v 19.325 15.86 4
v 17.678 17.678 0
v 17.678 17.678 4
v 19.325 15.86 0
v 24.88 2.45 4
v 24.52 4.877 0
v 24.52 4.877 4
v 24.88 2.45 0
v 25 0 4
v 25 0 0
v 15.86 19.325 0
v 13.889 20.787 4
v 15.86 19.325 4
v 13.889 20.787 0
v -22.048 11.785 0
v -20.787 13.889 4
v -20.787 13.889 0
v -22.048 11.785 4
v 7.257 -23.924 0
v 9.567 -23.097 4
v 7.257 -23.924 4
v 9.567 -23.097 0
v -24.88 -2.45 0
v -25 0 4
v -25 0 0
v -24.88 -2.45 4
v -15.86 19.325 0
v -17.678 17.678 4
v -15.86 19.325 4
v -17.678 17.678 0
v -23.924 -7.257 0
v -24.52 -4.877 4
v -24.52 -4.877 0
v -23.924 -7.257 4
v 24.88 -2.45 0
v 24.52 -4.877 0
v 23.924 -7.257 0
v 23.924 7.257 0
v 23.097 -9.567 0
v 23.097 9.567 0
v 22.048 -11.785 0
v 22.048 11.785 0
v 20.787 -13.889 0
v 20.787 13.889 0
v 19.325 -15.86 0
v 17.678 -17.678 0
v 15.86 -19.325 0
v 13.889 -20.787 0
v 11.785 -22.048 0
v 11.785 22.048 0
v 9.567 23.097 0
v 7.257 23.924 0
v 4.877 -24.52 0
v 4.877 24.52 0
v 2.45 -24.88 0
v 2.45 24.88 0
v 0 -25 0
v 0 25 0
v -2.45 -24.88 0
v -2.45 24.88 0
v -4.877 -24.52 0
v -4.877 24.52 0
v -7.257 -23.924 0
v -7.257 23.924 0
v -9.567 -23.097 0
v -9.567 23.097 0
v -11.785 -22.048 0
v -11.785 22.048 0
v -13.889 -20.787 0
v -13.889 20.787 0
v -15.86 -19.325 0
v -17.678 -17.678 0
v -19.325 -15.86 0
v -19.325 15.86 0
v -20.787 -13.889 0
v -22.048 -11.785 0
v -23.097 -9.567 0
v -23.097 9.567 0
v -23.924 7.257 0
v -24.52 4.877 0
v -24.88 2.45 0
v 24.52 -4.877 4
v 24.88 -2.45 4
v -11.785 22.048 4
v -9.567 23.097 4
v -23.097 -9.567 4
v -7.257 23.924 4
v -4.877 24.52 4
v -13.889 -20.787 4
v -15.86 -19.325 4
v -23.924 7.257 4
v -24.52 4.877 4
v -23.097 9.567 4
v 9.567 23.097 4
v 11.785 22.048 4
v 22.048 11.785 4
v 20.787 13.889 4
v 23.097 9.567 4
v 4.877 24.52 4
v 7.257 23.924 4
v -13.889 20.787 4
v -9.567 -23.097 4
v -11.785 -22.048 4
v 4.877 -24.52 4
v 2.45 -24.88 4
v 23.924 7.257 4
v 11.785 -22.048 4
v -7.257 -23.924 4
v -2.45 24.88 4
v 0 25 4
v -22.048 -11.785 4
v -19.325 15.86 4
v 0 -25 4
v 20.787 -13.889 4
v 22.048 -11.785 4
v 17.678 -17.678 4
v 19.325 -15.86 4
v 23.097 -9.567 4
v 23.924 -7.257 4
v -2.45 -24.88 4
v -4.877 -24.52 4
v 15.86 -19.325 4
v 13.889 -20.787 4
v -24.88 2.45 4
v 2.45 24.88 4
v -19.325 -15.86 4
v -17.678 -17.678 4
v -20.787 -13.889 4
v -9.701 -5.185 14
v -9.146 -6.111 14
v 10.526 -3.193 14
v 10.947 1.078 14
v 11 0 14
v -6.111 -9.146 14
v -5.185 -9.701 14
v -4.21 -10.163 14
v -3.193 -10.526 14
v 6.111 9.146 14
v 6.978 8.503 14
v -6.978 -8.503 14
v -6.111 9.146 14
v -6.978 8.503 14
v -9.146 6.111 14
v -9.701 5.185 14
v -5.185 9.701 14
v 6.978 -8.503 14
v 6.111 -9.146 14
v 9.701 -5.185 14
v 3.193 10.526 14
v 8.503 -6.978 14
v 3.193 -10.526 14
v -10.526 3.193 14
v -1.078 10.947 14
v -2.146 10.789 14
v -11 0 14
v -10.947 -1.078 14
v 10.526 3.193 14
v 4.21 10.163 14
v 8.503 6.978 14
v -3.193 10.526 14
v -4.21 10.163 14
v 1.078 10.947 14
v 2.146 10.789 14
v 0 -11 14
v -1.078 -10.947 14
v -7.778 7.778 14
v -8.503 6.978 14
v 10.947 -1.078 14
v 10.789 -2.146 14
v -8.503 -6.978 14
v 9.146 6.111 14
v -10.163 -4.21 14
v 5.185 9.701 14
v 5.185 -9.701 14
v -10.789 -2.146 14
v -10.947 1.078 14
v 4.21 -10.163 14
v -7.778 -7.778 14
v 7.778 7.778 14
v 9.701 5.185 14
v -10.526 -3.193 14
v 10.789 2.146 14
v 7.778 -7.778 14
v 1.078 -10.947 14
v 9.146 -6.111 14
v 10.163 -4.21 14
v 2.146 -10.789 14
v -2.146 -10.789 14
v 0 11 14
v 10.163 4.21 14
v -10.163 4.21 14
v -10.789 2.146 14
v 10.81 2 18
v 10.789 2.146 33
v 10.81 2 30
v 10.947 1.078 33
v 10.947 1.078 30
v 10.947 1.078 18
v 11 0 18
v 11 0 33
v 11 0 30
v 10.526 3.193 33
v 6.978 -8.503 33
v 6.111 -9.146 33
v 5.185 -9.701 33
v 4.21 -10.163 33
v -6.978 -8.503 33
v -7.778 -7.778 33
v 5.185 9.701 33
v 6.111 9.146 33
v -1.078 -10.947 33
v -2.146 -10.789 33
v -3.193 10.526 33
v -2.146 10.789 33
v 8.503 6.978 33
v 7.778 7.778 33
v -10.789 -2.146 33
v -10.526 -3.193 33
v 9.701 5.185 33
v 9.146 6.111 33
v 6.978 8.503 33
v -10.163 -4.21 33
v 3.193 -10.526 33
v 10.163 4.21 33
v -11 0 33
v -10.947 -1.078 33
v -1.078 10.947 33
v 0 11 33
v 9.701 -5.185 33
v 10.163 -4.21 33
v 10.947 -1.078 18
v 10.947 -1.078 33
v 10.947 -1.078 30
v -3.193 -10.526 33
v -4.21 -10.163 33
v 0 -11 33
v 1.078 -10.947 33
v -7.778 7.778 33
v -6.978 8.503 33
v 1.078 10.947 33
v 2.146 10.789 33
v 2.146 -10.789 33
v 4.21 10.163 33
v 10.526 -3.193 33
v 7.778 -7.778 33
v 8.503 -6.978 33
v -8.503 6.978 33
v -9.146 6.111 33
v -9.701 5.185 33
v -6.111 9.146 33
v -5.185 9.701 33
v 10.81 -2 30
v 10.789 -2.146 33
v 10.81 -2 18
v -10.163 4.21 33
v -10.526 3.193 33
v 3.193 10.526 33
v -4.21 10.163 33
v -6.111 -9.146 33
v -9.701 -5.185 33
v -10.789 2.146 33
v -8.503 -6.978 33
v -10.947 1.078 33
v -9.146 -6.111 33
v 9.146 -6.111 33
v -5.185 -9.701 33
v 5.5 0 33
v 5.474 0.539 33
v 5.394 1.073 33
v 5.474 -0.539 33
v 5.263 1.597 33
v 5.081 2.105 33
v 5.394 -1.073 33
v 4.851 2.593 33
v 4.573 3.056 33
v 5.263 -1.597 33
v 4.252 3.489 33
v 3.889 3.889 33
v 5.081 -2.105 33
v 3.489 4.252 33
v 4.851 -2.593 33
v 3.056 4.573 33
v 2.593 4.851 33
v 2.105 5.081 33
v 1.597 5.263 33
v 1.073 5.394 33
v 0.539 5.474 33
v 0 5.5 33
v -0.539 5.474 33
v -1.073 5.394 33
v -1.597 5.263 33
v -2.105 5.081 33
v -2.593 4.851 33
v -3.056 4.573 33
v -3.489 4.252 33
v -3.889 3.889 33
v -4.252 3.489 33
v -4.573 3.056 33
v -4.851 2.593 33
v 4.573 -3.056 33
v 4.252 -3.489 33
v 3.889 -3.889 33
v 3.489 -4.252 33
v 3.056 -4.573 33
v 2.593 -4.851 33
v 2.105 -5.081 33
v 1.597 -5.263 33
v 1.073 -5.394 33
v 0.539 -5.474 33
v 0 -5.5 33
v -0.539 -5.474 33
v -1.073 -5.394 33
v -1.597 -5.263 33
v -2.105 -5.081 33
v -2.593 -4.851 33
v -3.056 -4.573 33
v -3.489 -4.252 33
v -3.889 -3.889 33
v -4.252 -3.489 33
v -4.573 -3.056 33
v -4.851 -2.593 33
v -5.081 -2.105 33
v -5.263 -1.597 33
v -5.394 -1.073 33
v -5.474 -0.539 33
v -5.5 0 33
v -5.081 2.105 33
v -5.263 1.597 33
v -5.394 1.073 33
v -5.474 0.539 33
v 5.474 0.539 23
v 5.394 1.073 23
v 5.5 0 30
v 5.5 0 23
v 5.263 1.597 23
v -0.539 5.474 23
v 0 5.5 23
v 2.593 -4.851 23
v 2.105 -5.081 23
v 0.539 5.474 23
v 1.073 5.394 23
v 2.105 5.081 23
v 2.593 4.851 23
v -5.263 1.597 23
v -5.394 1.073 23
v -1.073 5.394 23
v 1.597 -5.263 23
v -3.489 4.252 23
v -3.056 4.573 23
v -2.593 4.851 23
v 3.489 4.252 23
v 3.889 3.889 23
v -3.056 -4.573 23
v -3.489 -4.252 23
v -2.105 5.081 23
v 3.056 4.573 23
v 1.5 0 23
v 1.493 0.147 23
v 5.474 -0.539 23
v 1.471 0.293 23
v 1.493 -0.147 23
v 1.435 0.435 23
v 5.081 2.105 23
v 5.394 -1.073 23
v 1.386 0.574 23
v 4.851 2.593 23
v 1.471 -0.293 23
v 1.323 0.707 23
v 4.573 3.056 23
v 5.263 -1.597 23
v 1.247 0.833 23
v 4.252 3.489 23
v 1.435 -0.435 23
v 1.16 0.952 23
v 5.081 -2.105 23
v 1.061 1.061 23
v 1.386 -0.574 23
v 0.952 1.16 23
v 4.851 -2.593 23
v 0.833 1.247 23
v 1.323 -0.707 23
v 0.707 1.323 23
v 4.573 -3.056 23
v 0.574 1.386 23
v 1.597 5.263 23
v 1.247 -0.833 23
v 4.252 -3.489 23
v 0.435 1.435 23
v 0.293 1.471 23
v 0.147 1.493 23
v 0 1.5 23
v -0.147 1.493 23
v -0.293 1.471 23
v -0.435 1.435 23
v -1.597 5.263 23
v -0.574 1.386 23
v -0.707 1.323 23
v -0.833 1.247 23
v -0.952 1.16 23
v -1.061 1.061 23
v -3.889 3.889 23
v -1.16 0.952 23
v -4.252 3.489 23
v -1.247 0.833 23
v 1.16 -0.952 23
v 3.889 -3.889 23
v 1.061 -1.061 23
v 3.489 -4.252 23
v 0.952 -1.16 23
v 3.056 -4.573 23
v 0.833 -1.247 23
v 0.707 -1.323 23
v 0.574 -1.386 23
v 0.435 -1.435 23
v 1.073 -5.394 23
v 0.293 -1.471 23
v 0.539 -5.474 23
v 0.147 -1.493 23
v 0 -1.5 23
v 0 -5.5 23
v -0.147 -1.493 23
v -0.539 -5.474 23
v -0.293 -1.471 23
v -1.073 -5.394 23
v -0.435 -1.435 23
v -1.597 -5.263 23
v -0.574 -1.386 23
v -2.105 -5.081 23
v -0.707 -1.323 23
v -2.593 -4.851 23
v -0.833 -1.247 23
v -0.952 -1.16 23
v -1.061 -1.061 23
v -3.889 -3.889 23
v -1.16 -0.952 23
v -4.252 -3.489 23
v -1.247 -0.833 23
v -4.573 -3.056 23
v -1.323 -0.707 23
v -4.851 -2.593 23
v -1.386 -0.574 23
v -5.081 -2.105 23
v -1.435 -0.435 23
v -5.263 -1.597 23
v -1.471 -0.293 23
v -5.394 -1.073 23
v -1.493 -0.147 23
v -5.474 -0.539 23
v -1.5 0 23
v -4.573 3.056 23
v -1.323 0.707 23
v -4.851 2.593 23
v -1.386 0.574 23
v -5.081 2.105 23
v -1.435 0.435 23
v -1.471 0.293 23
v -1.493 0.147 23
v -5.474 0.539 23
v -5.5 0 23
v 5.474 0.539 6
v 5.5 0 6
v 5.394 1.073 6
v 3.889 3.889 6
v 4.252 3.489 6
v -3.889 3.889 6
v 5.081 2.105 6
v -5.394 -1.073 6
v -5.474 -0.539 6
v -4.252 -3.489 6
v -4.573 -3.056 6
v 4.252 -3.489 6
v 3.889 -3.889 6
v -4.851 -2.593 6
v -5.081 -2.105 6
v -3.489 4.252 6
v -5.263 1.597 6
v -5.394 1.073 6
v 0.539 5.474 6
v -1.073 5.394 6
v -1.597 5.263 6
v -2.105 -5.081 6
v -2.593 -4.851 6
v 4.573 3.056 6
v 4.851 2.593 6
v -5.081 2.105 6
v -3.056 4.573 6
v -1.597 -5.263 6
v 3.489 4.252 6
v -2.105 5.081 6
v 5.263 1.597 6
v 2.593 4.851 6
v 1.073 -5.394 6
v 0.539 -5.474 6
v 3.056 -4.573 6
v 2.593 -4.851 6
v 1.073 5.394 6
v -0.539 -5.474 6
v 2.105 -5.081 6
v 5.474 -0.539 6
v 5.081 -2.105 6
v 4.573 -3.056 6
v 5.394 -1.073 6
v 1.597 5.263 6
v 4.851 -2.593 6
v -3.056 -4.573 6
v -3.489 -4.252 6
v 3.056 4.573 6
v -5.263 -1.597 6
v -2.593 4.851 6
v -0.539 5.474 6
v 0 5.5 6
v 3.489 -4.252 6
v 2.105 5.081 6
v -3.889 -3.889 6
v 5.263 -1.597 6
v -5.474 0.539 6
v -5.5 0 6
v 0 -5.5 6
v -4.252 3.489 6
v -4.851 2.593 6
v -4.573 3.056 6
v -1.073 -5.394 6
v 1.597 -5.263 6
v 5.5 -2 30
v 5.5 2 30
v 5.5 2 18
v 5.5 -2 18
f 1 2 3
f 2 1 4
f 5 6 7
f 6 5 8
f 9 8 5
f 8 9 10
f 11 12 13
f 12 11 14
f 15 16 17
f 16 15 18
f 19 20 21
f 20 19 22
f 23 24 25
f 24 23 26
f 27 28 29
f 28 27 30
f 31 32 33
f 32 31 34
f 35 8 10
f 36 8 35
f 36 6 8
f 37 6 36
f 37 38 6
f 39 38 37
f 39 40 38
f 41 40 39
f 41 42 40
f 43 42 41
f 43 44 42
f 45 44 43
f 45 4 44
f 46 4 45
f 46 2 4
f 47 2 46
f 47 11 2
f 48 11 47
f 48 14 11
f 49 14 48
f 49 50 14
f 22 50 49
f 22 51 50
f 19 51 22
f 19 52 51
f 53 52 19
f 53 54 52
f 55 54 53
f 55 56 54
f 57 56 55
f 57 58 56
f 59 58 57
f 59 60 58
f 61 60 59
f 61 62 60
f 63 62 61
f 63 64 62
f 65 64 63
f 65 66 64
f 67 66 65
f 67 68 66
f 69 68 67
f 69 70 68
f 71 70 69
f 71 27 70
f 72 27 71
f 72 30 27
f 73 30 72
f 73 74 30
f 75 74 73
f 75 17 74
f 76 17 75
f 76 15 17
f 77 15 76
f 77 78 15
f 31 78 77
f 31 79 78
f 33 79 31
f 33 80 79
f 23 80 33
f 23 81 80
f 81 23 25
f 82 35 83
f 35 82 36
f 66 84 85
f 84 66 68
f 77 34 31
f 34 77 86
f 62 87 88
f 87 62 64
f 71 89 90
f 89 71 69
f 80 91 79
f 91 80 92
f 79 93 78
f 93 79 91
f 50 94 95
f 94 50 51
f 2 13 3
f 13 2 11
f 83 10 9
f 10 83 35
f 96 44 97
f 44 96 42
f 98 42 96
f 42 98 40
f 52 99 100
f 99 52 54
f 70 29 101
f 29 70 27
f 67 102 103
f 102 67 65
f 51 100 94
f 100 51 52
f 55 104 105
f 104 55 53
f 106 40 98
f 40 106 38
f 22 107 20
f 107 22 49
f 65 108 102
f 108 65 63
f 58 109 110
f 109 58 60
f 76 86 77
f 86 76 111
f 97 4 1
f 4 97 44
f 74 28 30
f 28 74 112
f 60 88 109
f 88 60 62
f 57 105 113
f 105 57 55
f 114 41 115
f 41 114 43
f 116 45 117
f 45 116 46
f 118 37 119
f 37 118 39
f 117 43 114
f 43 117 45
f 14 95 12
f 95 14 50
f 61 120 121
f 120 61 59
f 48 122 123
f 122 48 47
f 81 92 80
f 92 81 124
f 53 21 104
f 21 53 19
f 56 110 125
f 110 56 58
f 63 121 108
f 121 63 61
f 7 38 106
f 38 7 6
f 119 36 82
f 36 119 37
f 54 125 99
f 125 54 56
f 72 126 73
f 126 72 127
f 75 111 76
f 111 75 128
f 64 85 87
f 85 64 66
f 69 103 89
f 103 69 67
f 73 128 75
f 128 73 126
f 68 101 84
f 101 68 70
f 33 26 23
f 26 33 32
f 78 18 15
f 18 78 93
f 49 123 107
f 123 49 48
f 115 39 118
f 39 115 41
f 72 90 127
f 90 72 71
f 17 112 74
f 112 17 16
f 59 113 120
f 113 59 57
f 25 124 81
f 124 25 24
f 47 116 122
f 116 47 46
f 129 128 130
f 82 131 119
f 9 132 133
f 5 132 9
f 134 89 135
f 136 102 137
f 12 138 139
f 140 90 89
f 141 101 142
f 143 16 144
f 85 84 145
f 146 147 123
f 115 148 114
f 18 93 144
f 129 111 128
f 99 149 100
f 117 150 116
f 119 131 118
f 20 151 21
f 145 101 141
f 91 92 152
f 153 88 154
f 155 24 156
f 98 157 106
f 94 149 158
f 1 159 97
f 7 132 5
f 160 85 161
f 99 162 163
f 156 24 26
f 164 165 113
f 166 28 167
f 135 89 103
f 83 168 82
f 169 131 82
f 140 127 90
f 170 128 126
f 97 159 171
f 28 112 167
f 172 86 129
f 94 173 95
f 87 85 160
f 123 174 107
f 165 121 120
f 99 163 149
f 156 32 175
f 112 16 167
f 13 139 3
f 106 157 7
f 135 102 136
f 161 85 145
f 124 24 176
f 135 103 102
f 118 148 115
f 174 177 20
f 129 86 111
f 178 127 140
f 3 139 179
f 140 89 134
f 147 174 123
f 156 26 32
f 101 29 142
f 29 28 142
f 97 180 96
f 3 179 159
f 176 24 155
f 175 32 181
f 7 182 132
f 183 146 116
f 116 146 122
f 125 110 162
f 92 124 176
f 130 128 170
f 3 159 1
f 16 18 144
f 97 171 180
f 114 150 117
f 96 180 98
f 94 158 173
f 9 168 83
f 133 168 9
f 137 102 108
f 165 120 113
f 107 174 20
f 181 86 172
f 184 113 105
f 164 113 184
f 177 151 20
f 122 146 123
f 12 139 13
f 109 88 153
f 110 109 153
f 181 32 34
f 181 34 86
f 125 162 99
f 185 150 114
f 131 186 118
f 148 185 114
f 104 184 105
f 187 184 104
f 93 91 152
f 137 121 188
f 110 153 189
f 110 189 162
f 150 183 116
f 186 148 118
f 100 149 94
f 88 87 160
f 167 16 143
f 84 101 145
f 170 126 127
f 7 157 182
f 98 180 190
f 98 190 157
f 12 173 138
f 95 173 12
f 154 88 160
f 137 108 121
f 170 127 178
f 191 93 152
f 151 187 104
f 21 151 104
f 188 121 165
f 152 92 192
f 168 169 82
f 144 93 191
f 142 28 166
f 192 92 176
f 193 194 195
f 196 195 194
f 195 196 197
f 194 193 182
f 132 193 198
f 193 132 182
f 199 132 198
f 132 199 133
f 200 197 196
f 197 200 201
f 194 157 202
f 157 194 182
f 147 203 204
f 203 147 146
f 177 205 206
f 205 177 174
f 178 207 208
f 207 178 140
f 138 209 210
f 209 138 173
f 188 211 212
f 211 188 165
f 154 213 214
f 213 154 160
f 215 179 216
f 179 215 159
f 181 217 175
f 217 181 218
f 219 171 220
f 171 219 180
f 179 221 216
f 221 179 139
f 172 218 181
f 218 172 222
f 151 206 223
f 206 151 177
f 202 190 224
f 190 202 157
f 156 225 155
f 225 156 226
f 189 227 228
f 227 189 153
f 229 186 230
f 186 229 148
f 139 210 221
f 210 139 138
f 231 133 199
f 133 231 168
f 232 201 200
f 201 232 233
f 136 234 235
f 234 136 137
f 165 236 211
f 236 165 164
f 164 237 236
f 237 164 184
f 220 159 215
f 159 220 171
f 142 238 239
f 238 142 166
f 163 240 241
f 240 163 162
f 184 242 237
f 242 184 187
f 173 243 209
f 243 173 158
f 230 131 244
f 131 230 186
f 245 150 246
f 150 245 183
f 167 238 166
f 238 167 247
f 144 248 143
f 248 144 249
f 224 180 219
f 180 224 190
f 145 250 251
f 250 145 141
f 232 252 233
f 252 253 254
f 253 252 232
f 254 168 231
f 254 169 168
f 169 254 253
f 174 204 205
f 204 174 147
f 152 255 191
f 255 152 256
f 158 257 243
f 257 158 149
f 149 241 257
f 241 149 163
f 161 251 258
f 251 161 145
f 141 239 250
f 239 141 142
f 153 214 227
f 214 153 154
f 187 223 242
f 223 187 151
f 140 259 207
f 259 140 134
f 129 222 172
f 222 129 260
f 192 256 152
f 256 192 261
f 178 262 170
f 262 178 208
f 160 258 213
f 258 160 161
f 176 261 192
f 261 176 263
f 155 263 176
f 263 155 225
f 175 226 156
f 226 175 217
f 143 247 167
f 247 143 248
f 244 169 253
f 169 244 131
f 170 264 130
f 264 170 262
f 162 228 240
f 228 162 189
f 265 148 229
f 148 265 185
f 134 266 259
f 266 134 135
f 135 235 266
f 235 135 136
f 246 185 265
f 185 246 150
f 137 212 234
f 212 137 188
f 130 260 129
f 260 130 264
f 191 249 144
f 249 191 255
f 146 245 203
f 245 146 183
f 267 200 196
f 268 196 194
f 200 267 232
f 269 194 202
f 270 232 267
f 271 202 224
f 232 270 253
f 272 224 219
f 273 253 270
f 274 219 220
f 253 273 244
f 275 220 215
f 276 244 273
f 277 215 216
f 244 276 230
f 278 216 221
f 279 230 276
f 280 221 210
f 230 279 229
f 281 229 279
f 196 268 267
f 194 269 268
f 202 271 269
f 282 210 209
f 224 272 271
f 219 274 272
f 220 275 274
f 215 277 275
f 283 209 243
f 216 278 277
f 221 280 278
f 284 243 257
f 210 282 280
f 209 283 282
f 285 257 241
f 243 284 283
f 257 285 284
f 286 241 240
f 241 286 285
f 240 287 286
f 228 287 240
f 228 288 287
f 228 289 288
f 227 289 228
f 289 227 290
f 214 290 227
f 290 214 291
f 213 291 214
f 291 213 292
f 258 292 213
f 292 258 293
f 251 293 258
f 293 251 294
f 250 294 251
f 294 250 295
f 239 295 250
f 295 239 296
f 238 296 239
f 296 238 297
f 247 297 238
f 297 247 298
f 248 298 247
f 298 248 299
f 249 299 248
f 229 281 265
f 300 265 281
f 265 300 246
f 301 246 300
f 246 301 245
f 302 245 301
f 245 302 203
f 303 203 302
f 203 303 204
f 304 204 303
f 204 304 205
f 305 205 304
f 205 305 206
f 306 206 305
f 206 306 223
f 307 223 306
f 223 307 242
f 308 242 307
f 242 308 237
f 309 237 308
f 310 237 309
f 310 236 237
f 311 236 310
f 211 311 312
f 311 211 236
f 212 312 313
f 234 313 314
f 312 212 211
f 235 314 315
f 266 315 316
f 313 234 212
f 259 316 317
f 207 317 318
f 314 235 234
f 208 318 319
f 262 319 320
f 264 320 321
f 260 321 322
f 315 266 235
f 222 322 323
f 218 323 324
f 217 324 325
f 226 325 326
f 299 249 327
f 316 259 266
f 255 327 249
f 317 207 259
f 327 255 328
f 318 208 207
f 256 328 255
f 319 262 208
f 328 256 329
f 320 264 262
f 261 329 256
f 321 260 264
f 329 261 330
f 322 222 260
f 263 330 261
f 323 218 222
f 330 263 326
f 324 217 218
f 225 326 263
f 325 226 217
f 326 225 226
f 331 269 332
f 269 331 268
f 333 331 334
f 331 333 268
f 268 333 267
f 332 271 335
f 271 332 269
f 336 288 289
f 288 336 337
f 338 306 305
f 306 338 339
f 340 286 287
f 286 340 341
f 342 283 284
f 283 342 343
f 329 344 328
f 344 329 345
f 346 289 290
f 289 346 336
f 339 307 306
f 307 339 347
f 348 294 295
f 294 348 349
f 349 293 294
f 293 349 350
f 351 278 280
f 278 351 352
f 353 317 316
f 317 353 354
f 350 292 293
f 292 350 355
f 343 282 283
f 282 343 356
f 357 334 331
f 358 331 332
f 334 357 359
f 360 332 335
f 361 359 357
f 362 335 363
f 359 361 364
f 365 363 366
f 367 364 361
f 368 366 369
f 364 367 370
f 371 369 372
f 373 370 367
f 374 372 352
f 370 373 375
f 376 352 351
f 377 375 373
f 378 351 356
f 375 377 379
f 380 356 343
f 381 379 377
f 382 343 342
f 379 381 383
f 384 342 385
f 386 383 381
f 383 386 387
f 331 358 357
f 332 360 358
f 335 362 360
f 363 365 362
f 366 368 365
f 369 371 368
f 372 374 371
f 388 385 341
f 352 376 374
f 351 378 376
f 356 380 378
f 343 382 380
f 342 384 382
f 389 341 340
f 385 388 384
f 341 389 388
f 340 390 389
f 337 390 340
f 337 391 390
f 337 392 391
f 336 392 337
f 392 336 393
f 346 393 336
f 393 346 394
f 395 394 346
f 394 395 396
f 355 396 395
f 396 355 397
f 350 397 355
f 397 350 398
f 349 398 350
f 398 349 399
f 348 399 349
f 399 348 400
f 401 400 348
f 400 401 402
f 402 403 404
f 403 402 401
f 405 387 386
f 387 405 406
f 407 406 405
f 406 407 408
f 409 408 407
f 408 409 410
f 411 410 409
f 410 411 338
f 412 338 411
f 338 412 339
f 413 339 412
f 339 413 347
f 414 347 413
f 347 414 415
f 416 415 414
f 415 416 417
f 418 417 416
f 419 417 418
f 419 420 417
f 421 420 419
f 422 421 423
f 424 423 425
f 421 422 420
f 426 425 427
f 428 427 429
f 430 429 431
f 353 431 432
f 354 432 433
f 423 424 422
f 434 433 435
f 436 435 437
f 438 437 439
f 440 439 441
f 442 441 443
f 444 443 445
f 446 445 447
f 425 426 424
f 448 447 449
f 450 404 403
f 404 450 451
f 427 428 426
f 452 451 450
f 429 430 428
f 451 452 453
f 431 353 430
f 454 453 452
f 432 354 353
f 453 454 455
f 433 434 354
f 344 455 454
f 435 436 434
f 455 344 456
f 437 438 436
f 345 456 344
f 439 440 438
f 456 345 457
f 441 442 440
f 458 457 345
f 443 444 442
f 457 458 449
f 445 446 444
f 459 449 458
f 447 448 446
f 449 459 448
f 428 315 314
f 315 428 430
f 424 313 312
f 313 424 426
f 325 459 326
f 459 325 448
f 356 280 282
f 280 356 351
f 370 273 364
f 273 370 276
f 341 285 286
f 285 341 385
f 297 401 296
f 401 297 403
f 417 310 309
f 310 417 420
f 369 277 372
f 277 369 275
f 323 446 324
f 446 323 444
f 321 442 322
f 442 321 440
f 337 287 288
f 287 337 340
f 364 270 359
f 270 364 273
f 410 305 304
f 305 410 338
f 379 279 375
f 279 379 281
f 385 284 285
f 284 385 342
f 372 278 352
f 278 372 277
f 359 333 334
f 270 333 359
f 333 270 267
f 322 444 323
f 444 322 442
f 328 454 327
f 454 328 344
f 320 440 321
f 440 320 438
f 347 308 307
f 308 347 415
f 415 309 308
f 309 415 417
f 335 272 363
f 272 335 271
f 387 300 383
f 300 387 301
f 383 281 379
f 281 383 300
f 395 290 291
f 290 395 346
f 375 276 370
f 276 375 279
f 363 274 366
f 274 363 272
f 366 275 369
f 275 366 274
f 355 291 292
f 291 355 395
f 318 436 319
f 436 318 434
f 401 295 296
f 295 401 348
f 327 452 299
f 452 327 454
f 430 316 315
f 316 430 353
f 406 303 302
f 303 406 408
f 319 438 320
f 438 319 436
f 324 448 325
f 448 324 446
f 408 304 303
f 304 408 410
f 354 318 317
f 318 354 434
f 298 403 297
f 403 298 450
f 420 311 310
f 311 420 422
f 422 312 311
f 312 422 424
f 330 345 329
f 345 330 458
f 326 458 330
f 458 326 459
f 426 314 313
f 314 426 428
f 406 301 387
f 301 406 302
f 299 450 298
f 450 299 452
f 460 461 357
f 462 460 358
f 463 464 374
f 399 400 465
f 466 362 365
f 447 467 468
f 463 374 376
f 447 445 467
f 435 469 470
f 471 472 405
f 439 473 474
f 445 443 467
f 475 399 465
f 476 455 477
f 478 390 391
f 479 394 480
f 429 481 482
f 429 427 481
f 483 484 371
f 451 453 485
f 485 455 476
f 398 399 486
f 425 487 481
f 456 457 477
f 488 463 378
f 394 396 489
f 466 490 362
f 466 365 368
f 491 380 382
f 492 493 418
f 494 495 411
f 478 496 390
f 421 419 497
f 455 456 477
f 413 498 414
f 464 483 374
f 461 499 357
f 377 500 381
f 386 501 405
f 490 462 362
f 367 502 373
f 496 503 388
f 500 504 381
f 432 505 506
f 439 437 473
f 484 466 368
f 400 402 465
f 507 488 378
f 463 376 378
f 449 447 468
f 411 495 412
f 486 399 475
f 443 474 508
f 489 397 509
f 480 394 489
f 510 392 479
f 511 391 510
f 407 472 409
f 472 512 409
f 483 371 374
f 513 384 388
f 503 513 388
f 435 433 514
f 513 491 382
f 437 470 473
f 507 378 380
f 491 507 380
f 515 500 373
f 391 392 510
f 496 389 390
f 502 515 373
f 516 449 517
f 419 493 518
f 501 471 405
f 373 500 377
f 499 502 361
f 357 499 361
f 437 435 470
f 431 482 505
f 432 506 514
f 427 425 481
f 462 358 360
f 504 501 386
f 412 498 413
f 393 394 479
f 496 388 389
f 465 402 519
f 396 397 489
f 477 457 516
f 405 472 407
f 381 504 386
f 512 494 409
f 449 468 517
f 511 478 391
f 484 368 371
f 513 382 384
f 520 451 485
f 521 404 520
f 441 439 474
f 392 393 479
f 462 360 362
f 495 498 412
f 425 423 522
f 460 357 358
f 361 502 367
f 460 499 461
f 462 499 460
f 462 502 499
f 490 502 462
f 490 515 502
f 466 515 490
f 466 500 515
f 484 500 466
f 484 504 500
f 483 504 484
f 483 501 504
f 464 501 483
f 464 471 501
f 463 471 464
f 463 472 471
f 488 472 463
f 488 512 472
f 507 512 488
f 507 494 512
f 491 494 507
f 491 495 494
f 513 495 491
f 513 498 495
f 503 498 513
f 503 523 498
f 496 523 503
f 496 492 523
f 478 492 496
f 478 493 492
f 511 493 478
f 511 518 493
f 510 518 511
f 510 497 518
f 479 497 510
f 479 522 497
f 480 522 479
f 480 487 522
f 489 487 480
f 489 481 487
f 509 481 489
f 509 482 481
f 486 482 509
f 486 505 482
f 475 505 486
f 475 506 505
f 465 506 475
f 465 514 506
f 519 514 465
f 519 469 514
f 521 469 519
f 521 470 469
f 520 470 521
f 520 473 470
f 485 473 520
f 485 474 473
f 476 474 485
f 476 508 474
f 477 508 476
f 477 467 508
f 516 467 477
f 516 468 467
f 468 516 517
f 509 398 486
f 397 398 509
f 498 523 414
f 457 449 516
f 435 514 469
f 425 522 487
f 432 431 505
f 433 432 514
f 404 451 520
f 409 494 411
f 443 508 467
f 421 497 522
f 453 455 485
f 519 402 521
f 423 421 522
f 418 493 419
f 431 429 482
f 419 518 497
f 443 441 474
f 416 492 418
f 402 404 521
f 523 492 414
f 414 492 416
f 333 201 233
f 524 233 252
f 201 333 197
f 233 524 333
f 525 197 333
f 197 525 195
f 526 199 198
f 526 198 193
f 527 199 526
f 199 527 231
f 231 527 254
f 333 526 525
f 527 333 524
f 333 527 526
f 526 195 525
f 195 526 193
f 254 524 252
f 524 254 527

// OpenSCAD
// 1.5 mL microcentrifuge tube stand for an analytical balance
// Printed standing up: rests on XY plane at z = 0, builds upward (+Z), centred on origin.

$fn = 64;

// ---- Overall body dimensions (mm) ----
base_d   = 50;   // base disc diameter
base_h   = 4;    // base disc height (z = 0 .. 4)
cone_top_d = 22; // cone narrows to this diameter at z = 14
cone_h   = 10;   // cone height (z = 4 .. 14)
col_d    = 22;   // column diameter
col_h    = 19;   // column height (z = 14 .. 33)
top_z    = 33;   // top of the stand

// ---- Tube seat (bore) dimensions ----
seat_d   = 11;   // seat bore diameter (z = 33 .. 23)
seat_h   = 10;   // seat bore height (z = 23 .. 33)
tip_d    = 3;    // cone bore narrows to this at z = 6
tip_h    = 17;   // cone bore height (z = 6 .. 23)

// ---- Viewing window dimensions ----
win_w    = 4;    // window width in Y
win_z0   = 18;   // window bottom z
win_z1   = 30;   // window top z
win_h    = win_z1 - win_z0;

// ---- Build the solid body (base + cone + column) ----
module body() { union() {
    // base disc
    translate([0, 0, 0])
        cylinder(h = base_h, d = base_d);

    // cone narrowing from base_d to cone_top_d
    translate([0, 0, base_h])
        cylinder(h = cone_h, d1 = base_d, d2 = cone_top_d);

    // column
    translate([0, 0, base_h + cone_h])
        cylinder(h = col_h, d = col_d);
} }

// ---- Tube seat bore (cylinder + cone), extended 1 mm past the top ----
module seat() { union() {
    // seat cylinder: z = 23 .. 34 (1 mm past top at 33)
    translate([0, 0, 23])
        cylinder(h = 11, d = seat_d);

    // cone: z = 6 .. 23, narrowing from seat_d to tip_d
    translate([0, 0, 6])
        cylinder(h = tip_h, d1 = seat_d, d2 = tip_d);
} }

// ---- Viewing window: straight through the +X wall, from the seat to outside ----
// Box extends in X from the seat bore (x = 5.5) to well past the column outer wall (x = 11),
// so it cuts a clean slot through the wall.
module window() { translate([5.5, -win_w / 2, win_z0])
    cube([11, win_w, win_h]); }

// ---- Final part: body minus seat bore minus viewing window ----
difference() {
    body();
    seat();
    window();
}
